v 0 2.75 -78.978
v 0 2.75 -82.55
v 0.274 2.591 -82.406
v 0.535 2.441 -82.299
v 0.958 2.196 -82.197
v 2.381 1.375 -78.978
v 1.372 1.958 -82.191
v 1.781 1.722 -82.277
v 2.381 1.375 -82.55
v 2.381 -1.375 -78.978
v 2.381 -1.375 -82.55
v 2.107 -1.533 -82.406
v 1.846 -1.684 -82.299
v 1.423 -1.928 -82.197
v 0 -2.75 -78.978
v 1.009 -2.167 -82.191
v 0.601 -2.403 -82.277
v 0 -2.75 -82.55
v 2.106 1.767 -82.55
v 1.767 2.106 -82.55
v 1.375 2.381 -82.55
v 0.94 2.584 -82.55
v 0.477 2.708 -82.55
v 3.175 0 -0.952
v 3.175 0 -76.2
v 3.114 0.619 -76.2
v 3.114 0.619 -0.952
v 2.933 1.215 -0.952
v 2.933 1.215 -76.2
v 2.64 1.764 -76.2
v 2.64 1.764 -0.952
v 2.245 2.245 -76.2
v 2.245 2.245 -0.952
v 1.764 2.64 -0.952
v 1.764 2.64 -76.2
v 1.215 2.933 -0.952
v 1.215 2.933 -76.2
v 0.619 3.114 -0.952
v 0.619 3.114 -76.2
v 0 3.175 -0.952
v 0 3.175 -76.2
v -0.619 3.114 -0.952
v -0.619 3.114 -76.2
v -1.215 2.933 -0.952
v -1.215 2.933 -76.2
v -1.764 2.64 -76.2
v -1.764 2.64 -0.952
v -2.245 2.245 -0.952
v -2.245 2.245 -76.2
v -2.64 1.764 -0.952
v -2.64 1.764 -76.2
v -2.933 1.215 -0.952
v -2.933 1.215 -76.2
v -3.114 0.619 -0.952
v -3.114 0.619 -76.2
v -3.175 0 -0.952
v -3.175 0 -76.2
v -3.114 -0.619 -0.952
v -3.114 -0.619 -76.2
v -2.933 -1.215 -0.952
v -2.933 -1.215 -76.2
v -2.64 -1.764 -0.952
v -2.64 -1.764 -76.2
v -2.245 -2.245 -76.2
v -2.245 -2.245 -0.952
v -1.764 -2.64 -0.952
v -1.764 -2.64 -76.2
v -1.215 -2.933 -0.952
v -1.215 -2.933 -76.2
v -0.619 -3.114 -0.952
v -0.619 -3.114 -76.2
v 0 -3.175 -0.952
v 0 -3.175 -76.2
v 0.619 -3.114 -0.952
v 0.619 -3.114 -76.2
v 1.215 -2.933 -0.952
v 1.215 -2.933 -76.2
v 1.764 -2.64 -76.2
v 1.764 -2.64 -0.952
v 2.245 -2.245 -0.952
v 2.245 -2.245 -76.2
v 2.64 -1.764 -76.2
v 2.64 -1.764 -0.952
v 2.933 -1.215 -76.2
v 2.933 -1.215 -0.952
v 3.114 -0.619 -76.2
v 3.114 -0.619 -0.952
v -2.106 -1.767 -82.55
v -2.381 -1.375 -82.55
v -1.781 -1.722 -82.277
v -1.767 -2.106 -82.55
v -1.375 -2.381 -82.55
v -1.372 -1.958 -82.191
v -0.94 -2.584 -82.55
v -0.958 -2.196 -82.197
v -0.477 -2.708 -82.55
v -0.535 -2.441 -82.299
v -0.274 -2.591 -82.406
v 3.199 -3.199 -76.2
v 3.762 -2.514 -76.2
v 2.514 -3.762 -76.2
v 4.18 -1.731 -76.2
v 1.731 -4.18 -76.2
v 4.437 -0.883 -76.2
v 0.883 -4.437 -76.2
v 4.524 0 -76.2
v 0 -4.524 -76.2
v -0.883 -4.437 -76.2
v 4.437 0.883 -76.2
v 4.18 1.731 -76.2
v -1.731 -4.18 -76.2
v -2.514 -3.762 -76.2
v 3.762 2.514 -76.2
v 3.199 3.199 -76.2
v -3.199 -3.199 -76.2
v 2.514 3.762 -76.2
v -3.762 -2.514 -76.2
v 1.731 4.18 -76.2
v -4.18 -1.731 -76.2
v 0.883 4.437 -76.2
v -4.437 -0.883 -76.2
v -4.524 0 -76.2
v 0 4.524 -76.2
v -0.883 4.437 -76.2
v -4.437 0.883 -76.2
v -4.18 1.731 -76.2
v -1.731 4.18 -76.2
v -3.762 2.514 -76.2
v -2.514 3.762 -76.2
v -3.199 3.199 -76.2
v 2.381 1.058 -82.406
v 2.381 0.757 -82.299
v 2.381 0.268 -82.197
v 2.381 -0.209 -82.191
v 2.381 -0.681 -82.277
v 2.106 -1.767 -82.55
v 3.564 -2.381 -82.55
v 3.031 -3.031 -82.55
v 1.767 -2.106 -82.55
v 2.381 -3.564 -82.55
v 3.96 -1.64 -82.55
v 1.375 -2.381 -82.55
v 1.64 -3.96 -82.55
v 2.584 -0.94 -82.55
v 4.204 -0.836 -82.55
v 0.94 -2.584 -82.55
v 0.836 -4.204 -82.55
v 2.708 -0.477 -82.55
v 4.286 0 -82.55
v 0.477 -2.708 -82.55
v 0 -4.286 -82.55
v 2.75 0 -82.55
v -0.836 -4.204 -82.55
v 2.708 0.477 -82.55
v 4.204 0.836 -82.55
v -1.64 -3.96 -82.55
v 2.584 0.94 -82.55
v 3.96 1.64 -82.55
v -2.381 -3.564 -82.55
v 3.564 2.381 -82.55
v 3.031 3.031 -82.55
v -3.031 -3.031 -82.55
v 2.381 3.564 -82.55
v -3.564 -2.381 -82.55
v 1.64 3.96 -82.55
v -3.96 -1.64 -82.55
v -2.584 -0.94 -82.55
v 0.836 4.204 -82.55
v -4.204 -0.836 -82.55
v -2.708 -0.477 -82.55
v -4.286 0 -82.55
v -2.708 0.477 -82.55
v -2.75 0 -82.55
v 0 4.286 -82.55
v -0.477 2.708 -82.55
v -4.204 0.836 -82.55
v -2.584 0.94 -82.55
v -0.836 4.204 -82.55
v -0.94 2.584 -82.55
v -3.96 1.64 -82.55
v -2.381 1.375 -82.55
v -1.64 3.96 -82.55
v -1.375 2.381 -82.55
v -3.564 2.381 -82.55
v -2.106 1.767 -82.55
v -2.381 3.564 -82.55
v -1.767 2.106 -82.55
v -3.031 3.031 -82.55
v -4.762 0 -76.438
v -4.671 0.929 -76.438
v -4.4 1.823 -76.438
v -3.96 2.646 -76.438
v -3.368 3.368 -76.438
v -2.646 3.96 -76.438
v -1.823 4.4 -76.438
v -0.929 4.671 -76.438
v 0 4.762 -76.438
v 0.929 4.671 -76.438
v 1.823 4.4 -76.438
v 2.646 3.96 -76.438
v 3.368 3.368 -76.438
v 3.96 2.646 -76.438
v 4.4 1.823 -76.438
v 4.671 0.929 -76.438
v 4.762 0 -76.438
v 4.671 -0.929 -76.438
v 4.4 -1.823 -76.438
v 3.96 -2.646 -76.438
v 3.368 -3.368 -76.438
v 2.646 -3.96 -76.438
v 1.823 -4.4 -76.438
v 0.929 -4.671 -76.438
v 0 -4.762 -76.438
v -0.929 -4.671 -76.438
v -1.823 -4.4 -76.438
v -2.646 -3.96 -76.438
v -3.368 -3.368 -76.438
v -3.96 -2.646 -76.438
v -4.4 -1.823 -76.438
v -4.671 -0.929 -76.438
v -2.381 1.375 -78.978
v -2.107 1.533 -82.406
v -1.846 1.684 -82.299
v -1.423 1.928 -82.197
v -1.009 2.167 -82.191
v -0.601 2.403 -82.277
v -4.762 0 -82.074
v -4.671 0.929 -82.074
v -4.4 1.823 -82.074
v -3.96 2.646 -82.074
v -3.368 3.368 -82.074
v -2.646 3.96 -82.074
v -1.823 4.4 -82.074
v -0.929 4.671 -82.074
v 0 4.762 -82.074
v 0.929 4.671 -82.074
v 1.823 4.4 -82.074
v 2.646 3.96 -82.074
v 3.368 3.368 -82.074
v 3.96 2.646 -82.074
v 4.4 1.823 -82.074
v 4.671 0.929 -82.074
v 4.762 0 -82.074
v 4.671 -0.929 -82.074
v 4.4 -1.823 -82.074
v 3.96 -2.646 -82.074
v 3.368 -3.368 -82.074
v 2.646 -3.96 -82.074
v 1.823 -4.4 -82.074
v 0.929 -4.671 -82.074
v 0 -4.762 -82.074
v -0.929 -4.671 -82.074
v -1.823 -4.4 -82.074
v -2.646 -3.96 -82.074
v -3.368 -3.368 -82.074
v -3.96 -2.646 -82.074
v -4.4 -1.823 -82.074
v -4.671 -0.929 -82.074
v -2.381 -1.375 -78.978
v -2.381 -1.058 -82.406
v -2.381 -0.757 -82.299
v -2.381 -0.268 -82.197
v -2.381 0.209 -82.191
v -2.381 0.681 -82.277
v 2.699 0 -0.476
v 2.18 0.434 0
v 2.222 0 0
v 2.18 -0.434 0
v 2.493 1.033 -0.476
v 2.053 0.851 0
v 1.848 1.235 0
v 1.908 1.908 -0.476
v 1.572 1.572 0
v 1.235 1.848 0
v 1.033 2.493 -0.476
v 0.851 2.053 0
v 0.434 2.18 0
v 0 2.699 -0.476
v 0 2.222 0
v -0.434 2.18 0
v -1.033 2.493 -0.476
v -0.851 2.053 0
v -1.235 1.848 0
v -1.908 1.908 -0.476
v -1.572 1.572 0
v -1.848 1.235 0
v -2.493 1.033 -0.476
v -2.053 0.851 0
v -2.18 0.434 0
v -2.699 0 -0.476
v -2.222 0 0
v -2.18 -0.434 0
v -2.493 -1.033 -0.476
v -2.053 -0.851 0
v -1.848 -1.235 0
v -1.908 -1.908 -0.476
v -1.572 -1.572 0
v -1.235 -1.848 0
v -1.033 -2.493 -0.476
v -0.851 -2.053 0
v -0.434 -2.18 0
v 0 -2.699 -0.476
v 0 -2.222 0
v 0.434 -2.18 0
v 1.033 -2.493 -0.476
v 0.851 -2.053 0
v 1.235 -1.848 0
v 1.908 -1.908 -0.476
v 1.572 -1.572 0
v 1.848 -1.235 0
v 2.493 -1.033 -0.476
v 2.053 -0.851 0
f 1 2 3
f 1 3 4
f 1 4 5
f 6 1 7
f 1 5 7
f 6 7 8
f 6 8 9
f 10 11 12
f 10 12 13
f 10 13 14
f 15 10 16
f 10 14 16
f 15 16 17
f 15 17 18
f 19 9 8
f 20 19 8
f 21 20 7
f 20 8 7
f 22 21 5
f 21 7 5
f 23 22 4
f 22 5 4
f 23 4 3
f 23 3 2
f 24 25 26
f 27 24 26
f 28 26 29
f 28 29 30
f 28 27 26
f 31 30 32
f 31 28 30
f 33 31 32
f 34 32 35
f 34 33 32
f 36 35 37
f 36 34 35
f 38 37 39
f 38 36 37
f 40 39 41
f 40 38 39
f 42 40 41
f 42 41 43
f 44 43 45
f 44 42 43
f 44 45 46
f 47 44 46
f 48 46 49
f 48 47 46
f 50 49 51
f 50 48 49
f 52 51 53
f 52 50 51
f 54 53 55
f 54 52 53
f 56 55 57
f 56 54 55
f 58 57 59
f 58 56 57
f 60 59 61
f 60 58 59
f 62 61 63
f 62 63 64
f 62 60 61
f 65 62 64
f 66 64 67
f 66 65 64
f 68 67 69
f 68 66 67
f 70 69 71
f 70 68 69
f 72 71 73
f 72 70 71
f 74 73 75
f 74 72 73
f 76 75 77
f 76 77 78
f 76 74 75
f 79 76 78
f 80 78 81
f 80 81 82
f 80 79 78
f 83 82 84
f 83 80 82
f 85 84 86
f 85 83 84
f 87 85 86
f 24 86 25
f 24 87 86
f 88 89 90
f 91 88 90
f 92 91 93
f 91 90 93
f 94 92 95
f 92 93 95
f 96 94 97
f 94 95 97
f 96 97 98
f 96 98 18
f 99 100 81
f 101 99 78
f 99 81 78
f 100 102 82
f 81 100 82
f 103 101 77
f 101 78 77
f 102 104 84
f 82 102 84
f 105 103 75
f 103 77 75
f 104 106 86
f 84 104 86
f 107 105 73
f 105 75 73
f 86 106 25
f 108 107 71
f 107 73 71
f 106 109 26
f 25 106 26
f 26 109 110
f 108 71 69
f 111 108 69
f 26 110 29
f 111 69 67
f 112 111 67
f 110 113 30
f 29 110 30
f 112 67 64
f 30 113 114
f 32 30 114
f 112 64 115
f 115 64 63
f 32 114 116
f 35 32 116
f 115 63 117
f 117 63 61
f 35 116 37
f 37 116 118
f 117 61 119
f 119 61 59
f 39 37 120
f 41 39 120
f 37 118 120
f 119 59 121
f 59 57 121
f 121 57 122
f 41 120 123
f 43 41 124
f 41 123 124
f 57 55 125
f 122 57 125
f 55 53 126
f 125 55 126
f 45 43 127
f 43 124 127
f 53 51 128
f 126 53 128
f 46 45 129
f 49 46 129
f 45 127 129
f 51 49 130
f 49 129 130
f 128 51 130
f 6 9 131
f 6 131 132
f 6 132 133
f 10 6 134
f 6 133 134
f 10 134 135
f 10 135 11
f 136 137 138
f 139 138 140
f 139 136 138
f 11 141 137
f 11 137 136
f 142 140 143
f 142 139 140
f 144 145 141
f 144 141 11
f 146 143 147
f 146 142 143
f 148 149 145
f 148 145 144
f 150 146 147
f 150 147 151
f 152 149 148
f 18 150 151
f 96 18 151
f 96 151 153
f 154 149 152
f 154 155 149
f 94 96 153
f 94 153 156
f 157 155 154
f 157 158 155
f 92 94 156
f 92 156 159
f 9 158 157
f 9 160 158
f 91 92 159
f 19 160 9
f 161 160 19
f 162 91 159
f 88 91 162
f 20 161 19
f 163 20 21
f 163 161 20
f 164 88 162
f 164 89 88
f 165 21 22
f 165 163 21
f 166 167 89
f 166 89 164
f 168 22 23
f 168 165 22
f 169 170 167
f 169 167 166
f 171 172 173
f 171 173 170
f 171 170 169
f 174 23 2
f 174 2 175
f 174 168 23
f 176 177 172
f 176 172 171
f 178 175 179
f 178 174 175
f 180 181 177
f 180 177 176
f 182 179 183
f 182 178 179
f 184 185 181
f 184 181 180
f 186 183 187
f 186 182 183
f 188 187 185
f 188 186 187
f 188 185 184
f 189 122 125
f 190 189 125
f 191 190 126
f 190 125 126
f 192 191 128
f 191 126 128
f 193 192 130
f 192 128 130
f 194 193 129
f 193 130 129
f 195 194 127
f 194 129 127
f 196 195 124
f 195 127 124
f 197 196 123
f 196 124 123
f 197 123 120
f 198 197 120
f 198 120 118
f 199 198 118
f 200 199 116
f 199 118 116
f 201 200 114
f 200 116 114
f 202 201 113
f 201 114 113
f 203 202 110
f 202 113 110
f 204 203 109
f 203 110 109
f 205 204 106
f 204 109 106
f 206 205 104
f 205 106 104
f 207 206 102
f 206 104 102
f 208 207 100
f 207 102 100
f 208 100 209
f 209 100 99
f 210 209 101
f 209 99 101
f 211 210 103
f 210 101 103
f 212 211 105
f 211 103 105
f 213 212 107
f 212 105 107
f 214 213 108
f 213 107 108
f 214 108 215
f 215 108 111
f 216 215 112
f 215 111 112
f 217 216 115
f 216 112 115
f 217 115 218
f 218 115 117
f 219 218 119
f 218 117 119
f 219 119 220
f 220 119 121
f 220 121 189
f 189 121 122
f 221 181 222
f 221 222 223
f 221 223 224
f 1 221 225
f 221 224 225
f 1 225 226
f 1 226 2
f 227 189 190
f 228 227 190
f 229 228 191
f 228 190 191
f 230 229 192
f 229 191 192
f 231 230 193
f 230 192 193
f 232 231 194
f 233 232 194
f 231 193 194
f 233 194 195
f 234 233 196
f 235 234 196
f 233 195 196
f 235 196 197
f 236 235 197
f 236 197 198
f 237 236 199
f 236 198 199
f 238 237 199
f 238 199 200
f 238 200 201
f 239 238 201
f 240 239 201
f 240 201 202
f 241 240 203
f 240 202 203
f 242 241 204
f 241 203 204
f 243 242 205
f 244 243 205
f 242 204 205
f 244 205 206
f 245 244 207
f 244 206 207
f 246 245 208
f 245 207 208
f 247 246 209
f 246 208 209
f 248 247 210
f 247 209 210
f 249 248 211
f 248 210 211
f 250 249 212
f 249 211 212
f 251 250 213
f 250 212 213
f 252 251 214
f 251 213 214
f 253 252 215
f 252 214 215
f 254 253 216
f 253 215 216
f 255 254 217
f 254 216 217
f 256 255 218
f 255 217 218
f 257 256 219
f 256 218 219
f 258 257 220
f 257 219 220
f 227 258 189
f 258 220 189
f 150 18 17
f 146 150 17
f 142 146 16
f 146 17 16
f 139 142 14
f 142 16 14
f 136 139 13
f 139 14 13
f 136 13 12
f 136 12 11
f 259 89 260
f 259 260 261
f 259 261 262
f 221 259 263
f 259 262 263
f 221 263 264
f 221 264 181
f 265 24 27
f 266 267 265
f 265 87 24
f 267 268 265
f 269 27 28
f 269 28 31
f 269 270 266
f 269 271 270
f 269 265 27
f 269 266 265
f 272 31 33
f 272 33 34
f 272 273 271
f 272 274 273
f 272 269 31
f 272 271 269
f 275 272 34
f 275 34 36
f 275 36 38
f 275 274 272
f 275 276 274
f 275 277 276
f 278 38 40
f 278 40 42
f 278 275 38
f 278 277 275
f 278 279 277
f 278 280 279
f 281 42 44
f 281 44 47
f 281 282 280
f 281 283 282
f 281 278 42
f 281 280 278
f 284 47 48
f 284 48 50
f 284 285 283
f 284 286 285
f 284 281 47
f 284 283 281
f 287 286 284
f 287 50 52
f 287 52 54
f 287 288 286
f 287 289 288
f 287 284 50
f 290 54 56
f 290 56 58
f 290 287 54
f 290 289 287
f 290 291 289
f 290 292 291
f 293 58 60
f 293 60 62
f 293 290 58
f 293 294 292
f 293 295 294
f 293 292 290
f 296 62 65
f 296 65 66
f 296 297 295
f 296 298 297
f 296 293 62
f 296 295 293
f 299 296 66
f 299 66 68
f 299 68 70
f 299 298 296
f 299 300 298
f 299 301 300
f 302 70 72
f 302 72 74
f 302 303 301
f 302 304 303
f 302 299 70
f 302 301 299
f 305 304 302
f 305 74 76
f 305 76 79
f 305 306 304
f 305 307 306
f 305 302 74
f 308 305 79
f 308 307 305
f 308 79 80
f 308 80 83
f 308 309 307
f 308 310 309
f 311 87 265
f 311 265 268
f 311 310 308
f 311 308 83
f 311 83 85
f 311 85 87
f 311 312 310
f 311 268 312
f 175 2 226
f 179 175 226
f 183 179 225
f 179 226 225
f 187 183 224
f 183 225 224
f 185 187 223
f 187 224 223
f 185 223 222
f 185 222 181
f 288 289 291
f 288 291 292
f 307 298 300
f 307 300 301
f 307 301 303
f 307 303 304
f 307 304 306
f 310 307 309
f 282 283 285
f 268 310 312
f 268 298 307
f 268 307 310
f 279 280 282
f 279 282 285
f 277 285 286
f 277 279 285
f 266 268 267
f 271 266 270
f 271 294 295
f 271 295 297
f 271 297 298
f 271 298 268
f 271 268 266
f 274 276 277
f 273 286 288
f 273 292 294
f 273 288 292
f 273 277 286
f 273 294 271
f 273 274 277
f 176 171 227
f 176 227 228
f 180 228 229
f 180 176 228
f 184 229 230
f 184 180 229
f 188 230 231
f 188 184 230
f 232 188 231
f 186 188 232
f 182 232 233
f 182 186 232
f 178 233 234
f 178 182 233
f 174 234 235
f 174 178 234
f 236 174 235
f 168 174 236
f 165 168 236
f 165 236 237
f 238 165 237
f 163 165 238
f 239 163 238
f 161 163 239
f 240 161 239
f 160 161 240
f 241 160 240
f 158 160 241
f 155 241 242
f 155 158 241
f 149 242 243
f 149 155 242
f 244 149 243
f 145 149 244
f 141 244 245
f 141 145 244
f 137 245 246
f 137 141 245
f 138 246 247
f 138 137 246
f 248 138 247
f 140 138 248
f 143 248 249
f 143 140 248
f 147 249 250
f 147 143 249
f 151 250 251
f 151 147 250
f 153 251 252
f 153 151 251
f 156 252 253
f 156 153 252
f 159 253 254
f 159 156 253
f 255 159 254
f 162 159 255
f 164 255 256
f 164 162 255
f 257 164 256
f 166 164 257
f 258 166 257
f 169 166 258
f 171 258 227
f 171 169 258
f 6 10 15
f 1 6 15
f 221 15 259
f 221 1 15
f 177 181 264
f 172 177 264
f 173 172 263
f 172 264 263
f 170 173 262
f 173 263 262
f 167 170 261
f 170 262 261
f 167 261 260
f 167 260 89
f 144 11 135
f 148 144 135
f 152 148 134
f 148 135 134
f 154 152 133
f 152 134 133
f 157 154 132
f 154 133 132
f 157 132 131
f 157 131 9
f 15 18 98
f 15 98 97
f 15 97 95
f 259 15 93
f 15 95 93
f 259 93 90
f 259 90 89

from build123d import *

# Parameters (mm, degrees)
SKETCH1_R          = 3.175
EXTRUDE1_DEPTH     = 76.2
CHAMFER3_SIZE      = 0.9525
SKETCH6_R          = 4.7625
EXTRUDE2_DEPTH     = 6.35
CUT_EXTRUDE1_DEPTH = 3.571875
CHAMFER1_SIZE      = 0.47625
CHAMFER2_SIZE      = 0.238125


with BuildPart() as part:
    # Sketch1 → Extrude1 (new body)
    with BuildSketch(Plane.XY):
        Circle(SKETCH1_R)
    extrude(amount=-EXTRUDE1_DEPTH)

    # Chamfer3
    chamfer3_edges = [part.edges().sort_by_distance(p)[0] for p in [
        (-3.175, 0, 0),
    ]]
    chamfer(chamfer3_edges, length=CHAMFER3_SIZE)

    # Sketch6 → Extrude2 (add)
    with BuildSketch(Plane(origin=(0, 0, -76.2), x_dir=(-1, 0, 0), z_dir=(0, 0, -1))):
        Circle(SKETCH6_R)
    extrude(amount=EXTRUDE2_DEPTH)

    # Sketch7 → Cut-Extrude1 (cut)
    with BuildSketch(Plane(origin=(0, 0, -82.55), x_dir=(-1, 0, 0), z_dir=(0, 0, -1))):
        Polygon((0, 2.749630657), (-2.38125, 1.374815329), (-2.38125, -1.374815329), (0, -2.749630657), (2.38125, -1.374815329), (2.38125, 1.374815329), align=None)
    extrude(amount=-CUT_EXTRUDE1_DEPTH, mode=Mode.SUBTRACT)

    # Cut-Extrude2 cone 1 section (through the dimple's axis) → Cut-Extrude2 (revolve, cut)
    with BuildSketch(Plane(origin=(0, 0, -82.55), x_dir=(0, 1, 0), z_dir=(1, 0, 0))):
        Polygon((0, 0), (2.749630657, 0), (0, 2.749630657), align=None)
    revolve(axis=Axis((0, 0, -82.55), (0, 0, 1)), mode=Mode.SUBTRACT)

    # Chamfer1
    chamfer1_edges = [part.edges().sort_by_distance(p)[0] for p in [
        (4.7625, 0, -82.55),
    ]]
    chamfer(chamfer1_edges, length=CHAMFER1_SIZE)

    # Chamfer2
    chamfer2_edges = [part.edges().sort_by_distance(p)[0] for p in [
        (4.7625, 0, -76.2),
    ]]
    chamfer(chamfer2_edges, length=CHAMFER2_SIZE)


solid = part.part
